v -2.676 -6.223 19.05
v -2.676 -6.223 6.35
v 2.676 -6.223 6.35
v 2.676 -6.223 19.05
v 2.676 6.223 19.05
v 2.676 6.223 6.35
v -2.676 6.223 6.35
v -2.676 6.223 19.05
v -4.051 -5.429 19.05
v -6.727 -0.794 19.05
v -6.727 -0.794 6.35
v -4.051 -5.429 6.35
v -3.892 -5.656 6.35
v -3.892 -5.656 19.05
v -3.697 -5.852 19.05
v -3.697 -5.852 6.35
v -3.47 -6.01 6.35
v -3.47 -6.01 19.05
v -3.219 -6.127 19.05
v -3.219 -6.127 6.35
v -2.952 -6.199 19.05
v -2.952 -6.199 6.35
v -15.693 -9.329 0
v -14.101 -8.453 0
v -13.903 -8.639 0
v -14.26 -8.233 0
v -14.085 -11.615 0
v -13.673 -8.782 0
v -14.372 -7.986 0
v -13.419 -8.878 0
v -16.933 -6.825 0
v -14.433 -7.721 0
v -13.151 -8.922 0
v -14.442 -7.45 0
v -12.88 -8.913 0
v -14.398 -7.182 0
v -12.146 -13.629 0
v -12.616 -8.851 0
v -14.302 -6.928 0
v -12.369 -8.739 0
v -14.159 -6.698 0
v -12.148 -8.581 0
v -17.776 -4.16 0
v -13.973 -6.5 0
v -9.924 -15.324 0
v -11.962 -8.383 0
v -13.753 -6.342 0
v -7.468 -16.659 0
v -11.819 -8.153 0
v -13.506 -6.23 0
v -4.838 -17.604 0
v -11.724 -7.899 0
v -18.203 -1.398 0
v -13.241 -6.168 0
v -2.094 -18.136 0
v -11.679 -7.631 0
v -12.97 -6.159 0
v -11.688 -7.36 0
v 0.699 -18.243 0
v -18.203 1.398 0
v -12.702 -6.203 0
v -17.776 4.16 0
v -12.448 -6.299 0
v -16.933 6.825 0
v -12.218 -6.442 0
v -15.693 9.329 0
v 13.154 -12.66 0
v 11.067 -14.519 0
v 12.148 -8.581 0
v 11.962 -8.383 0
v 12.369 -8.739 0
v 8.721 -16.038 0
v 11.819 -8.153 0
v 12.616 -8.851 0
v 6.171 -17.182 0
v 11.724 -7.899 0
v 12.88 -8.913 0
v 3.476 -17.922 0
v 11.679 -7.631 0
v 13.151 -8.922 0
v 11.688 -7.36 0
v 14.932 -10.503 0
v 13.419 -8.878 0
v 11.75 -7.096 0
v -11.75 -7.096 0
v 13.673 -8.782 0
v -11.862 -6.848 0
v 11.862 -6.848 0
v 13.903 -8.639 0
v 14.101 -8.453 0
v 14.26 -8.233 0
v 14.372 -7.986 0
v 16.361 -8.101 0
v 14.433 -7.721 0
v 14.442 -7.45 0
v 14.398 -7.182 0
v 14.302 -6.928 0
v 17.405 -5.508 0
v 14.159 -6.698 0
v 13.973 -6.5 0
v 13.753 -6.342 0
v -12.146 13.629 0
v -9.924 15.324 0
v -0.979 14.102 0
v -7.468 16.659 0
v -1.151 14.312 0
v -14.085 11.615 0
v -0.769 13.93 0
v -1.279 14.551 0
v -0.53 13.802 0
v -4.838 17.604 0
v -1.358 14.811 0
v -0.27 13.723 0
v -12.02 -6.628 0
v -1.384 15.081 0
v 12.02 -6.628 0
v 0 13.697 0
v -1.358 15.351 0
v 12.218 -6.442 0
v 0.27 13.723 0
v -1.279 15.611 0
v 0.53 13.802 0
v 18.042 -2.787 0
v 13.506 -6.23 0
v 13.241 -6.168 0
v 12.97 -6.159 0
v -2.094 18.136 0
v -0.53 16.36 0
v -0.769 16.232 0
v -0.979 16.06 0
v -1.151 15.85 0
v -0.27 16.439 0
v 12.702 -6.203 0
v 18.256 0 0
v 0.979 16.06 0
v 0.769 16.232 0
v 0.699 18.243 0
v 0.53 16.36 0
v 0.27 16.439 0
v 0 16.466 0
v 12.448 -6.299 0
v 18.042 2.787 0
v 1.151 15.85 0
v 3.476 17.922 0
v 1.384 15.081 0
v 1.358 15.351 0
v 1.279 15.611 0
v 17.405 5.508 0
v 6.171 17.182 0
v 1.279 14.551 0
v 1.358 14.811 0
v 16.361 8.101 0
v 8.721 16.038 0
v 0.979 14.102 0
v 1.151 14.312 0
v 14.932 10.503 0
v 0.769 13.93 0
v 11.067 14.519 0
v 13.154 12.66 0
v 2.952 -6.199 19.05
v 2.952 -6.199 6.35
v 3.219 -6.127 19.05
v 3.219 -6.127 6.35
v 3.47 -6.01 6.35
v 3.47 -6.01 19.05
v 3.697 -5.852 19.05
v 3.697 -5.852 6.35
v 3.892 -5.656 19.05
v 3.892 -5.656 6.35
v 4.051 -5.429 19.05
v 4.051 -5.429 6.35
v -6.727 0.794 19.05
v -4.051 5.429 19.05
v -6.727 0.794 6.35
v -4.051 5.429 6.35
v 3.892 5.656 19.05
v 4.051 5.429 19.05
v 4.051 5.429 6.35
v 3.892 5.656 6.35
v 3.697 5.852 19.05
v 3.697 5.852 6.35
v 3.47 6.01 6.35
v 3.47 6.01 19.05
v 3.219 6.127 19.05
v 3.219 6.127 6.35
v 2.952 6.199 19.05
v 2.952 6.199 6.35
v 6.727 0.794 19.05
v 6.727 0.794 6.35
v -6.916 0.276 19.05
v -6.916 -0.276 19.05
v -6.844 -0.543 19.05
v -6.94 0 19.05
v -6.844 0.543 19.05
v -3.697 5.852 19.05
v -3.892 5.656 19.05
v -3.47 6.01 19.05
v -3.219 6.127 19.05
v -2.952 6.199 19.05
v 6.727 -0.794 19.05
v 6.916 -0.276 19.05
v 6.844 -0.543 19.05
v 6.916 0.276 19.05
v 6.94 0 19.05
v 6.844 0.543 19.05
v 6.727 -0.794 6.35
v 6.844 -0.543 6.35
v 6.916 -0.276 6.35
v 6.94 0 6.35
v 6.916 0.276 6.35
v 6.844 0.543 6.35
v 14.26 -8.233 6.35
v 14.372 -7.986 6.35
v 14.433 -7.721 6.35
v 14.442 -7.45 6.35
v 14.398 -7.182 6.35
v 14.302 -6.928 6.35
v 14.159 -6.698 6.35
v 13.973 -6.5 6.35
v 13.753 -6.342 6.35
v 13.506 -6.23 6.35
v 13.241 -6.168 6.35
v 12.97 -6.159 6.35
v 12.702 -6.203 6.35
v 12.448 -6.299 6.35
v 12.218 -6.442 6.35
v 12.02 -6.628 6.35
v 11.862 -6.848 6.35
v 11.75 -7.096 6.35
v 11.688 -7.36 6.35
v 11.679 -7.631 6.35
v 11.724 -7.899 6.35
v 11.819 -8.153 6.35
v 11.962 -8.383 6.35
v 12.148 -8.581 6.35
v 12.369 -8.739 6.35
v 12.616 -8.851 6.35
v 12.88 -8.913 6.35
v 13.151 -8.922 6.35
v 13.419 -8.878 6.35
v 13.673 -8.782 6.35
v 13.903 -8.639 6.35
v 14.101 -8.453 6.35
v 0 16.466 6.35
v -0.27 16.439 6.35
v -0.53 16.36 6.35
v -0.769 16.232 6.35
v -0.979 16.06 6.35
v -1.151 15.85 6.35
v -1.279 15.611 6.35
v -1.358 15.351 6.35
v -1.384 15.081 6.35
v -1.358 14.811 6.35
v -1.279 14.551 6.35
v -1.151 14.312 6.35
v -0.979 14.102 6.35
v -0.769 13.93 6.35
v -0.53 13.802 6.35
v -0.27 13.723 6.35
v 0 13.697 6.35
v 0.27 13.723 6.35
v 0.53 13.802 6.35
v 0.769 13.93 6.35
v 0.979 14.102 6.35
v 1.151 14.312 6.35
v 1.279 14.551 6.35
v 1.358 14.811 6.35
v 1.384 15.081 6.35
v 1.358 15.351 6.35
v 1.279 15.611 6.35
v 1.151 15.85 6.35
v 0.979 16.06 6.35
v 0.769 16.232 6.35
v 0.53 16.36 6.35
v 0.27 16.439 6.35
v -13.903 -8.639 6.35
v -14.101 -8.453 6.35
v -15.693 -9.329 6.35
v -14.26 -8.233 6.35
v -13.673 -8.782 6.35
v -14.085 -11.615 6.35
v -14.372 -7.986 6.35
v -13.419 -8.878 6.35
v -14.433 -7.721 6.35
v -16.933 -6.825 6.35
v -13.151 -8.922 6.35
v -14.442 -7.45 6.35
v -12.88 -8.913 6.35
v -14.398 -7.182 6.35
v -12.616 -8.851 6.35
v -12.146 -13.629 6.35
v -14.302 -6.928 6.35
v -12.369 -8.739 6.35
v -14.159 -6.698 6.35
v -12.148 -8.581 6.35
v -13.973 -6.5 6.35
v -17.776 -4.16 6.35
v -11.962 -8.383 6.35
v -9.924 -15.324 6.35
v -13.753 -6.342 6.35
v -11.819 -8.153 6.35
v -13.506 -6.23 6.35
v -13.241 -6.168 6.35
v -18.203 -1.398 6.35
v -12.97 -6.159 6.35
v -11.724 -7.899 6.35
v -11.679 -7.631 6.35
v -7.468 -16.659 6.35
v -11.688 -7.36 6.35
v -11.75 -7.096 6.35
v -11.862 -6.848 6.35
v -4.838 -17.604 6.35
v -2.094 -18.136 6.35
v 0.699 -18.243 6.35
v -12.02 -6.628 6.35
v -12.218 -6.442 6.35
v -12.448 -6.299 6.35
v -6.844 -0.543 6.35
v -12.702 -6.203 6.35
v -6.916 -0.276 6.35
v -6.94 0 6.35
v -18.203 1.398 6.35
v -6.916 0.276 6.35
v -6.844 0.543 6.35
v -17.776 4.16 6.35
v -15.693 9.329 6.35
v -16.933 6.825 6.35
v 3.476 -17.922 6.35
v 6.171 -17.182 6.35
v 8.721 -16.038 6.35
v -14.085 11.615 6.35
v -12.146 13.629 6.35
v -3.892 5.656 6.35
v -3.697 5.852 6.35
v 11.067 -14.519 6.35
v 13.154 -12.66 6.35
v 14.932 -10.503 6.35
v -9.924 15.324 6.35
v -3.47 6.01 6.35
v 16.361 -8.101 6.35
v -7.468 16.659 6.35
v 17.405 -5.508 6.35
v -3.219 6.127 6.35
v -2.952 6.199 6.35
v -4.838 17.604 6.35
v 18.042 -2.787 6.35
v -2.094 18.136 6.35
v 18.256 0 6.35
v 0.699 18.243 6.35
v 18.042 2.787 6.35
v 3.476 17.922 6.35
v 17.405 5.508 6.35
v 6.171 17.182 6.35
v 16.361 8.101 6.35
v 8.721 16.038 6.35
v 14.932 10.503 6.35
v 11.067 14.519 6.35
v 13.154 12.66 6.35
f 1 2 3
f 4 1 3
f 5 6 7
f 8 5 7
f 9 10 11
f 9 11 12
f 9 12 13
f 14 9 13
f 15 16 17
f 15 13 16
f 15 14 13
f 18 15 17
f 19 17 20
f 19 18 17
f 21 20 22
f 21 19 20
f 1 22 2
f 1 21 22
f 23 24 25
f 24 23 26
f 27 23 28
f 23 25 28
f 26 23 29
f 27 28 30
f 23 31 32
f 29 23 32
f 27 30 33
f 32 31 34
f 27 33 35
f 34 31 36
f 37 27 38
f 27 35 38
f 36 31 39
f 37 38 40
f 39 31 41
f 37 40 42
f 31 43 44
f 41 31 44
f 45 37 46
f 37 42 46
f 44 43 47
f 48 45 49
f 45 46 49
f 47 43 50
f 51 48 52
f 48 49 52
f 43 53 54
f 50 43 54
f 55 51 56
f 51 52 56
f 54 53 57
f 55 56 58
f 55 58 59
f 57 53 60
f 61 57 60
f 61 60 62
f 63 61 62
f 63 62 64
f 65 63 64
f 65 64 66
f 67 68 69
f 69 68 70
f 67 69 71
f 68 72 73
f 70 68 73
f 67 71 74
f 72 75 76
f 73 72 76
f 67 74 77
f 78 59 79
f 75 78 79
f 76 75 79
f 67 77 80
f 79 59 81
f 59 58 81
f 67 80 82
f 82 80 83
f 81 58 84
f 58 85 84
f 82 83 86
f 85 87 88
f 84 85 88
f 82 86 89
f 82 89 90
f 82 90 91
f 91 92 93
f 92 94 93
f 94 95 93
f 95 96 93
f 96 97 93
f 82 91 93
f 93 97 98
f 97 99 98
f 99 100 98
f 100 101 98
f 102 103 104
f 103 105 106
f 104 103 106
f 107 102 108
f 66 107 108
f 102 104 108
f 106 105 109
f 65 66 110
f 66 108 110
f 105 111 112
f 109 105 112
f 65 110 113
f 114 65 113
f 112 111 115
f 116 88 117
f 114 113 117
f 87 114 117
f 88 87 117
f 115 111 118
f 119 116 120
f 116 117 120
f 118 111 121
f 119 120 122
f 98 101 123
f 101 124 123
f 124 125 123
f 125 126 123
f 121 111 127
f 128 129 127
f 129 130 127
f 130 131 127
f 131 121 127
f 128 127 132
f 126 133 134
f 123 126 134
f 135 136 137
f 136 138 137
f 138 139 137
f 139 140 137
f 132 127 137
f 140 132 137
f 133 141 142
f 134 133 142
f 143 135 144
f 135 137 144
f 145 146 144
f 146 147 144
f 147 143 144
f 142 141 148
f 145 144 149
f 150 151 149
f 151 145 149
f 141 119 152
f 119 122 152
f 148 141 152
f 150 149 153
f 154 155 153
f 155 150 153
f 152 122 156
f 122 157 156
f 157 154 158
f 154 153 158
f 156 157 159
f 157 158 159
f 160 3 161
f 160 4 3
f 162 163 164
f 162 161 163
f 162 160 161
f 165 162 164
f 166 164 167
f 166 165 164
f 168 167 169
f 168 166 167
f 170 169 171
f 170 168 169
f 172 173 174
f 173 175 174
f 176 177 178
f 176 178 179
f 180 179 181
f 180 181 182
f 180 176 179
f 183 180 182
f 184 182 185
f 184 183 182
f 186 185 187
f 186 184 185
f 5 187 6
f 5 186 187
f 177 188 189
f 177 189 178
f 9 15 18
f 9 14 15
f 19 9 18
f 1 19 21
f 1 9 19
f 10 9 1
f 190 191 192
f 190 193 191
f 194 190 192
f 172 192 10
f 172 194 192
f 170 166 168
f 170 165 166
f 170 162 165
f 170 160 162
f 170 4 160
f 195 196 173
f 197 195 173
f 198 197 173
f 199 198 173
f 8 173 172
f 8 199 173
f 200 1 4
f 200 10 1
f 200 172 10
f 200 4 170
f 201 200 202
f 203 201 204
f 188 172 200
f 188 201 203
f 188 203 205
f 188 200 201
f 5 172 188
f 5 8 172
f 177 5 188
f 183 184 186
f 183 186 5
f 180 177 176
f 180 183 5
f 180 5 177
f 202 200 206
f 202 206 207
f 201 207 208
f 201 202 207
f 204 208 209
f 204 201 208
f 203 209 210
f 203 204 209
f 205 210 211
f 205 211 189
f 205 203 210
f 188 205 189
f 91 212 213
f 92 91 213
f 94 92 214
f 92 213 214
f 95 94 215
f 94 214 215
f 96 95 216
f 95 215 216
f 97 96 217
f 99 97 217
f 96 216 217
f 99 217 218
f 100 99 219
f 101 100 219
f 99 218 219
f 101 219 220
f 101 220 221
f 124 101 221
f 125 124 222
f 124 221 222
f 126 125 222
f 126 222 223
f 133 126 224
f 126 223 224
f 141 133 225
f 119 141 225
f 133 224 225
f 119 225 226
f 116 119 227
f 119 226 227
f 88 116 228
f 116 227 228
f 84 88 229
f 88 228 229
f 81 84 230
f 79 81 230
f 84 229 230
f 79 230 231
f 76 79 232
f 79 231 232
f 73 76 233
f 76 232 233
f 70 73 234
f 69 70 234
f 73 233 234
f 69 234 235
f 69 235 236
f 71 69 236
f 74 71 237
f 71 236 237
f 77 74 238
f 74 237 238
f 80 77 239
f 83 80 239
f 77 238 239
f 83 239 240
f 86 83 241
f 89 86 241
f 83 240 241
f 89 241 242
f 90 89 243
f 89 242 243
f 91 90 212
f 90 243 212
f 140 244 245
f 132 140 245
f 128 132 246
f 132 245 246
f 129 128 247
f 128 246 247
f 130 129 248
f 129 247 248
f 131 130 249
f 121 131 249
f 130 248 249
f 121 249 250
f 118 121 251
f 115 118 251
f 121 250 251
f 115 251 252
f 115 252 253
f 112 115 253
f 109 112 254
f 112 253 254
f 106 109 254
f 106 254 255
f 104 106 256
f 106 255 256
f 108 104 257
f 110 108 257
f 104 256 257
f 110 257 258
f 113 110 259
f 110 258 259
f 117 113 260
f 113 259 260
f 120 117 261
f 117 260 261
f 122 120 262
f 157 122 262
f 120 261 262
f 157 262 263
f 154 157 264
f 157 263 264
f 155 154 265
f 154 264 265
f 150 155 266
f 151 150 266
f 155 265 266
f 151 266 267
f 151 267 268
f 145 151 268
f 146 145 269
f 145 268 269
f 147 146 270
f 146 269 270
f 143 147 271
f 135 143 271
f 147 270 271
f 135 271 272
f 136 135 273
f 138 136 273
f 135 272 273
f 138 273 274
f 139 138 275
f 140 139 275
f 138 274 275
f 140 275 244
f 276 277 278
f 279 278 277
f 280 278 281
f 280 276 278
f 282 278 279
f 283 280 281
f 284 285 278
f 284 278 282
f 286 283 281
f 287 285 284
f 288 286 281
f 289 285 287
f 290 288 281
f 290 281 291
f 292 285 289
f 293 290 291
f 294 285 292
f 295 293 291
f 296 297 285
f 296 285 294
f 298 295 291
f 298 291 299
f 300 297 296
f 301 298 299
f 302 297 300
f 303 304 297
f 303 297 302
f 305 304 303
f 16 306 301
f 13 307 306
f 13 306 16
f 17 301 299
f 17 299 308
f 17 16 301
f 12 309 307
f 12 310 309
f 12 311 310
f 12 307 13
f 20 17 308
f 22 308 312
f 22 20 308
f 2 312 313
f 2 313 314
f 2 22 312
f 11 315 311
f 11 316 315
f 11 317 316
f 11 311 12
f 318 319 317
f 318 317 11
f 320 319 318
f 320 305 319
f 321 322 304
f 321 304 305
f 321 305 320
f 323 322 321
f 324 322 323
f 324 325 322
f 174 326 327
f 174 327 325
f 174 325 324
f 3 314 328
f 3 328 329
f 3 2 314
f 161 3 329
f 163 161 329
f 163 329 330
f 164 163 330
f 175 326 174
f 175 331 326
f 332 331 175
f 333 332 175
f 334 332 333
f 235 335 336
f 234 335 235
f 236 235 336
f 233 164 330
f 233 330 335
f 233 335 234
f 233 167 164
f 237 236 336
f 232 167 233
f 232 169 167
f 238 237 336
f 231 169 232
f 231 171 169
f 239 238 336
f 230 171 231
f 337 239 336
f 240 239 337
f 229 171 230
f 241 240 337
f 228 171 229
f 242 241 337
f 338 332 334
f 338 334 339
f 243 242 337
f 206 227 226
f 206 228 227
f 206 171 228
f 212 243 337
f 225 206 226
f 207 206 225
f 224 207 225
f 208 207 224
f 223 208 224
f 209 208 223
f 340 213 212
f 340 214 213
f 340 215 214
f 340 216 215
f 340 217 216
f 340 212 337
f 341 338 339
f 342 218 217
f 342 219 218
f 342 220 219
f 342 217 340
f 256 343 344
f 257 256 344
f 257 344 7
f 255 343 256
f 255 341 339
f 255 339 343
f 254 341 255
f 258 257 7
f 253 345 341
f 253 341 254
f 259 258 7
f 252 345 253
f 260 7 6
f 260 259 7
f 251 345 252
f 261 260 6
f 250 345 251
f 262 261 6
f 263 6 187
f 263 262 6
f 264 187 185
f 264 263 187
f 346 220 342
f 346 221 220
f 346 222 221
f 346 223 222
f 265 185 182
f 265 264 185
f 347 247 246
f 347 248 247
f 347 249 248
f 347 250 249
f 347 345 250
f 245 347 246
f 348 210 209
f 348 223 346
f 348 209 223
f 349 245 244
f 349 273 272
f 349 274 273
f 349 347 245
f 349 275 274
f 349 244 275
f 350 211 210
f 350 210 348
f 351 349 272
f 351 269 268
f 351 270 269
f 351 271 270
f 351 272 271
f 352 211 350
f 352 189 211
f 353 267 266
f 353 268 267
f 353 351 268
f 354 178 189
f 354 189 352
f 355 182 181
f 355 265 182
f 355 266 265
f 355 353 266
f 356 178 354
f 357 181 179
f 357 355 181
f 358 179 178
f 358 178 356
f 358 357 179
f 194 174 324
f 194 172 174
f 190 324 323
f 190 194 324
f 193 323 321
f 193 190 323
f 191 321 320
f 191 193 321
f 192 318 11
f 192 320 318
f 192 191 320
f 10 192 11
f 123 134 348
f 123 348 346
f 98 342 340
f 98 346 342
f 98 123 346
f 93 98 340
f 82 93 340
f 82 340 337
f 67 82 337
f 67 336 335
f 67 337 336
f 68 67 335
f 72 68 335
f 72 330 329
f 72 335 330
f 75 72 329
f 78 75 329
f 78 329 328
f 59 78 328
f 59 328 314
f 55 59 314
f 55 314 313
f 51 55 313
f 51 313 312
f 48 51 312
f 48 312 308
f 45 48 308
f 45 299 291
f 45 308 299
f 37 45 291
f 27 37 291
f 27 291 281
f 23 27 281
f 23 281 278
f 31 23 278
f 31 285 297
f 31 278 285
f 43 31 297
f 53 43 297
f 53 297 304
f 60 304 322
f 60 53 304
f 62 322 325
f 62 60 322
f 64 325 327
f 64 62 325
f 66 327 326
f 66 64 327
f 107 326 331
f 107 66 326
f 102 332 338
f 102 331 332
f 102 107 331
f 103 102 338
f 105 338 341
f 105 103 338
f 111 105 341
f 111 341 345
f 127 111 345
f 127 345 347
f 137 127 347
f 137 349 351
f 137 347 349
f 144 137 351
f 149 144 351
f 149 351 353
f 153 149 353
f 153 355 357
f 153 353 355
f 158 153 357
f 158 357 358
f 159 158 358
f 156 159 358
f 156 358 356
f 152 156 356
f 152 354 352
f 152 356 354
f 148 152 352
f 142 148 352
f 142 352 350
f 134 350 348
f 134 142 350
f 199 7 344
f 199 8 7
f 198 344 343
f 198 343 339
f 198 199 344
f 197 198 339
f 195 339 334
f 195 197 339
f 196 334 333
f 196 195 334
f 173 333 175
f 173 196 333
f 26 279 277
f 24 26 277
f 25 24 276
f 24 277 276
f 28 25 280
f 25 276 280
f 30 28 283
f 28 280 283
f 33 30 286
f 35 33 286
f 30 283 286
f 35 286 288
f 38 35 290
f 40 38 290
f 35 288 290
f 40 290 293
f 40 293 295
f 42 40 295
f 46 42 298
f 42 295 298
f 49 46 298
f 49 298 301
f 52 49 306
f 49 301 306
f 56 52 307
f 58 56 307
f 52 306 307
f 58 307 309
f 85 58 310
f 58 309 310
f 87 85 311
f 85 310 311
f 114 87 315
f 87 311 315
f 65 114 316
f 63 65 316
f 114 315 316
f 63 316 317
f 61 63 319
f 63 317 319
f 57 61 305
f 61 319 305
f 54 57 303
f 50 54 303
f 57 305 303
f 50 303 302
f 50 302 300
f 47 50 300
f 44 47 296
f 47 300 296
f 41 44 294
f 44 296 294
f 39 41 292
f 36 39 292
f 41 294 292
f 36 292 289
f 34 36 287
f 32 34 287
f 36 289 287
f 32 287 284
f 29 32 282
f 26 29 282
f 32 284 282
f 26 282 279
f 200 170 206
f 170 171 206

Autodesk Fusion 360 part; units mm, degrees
sketch "Sketch1" plane through (0, 0, 0) normal (0, 0, 1) x (1, 0, 0)
  circle A0 centre (0, 0) radius 18.2563
  circle A1 centre (0, 0) radius 15.0812 construction
  line L0 (0, 0) -> (0, 18.2563) construction
  line L1 (3.5929, -6.223) -> (7.1857, 0)
  line L2 (7.1857, 0) -> (3.5929, 6.223)
  line L3 (3.5929, 6.223) -> (-3.5929, 6.223)
  line L4 (-3.5929, 6.223) -> (-7.1857, 0)
  line L5 (-7.1857, 0) -> (-3.5929, -6.223)
  line L6 (-3.5929, -6.223) -> (3.5929, -6.223)
  point P0 (0, 15.0812)
  dimension "d1" = 36.5125
  dimension "d2" = 30.1625
  dimension "d3" = 6.223
extrude "Extrude1" add sketch "Sketch1" along normal blind 6.35
extrude "Extrude2" add sketch "Sketch1" along normal blind 19.05 contours L1 L2 L3 L4 L5 L6
hole "Hole1" at (0, 15.0812, 0) direction (0, 0, 1) diameter 2.7686 depth 6.35 tip angle 118
pattern_circular "C-Pattern1" count 3 over 360 about axis through (0, 0, 0) along (0, 0, 1) of "Hole1"
fillet "Fillet1" radius 1.5875 6 edges at (3.5929, -6.223, 12.7) (-3.5929, -6.223, 12.7) (-7.1857, 0, 12.7) (-3.5929, 6.223, 12.7) (3.5929, 6.223, 12.7) (7.1857, 0, 12.7)
equation "d6 = d4 + shankLength"
equation "d14 = ( 1 / 16 ) * 1 in"
equation "shankLength = 0.5 in"
